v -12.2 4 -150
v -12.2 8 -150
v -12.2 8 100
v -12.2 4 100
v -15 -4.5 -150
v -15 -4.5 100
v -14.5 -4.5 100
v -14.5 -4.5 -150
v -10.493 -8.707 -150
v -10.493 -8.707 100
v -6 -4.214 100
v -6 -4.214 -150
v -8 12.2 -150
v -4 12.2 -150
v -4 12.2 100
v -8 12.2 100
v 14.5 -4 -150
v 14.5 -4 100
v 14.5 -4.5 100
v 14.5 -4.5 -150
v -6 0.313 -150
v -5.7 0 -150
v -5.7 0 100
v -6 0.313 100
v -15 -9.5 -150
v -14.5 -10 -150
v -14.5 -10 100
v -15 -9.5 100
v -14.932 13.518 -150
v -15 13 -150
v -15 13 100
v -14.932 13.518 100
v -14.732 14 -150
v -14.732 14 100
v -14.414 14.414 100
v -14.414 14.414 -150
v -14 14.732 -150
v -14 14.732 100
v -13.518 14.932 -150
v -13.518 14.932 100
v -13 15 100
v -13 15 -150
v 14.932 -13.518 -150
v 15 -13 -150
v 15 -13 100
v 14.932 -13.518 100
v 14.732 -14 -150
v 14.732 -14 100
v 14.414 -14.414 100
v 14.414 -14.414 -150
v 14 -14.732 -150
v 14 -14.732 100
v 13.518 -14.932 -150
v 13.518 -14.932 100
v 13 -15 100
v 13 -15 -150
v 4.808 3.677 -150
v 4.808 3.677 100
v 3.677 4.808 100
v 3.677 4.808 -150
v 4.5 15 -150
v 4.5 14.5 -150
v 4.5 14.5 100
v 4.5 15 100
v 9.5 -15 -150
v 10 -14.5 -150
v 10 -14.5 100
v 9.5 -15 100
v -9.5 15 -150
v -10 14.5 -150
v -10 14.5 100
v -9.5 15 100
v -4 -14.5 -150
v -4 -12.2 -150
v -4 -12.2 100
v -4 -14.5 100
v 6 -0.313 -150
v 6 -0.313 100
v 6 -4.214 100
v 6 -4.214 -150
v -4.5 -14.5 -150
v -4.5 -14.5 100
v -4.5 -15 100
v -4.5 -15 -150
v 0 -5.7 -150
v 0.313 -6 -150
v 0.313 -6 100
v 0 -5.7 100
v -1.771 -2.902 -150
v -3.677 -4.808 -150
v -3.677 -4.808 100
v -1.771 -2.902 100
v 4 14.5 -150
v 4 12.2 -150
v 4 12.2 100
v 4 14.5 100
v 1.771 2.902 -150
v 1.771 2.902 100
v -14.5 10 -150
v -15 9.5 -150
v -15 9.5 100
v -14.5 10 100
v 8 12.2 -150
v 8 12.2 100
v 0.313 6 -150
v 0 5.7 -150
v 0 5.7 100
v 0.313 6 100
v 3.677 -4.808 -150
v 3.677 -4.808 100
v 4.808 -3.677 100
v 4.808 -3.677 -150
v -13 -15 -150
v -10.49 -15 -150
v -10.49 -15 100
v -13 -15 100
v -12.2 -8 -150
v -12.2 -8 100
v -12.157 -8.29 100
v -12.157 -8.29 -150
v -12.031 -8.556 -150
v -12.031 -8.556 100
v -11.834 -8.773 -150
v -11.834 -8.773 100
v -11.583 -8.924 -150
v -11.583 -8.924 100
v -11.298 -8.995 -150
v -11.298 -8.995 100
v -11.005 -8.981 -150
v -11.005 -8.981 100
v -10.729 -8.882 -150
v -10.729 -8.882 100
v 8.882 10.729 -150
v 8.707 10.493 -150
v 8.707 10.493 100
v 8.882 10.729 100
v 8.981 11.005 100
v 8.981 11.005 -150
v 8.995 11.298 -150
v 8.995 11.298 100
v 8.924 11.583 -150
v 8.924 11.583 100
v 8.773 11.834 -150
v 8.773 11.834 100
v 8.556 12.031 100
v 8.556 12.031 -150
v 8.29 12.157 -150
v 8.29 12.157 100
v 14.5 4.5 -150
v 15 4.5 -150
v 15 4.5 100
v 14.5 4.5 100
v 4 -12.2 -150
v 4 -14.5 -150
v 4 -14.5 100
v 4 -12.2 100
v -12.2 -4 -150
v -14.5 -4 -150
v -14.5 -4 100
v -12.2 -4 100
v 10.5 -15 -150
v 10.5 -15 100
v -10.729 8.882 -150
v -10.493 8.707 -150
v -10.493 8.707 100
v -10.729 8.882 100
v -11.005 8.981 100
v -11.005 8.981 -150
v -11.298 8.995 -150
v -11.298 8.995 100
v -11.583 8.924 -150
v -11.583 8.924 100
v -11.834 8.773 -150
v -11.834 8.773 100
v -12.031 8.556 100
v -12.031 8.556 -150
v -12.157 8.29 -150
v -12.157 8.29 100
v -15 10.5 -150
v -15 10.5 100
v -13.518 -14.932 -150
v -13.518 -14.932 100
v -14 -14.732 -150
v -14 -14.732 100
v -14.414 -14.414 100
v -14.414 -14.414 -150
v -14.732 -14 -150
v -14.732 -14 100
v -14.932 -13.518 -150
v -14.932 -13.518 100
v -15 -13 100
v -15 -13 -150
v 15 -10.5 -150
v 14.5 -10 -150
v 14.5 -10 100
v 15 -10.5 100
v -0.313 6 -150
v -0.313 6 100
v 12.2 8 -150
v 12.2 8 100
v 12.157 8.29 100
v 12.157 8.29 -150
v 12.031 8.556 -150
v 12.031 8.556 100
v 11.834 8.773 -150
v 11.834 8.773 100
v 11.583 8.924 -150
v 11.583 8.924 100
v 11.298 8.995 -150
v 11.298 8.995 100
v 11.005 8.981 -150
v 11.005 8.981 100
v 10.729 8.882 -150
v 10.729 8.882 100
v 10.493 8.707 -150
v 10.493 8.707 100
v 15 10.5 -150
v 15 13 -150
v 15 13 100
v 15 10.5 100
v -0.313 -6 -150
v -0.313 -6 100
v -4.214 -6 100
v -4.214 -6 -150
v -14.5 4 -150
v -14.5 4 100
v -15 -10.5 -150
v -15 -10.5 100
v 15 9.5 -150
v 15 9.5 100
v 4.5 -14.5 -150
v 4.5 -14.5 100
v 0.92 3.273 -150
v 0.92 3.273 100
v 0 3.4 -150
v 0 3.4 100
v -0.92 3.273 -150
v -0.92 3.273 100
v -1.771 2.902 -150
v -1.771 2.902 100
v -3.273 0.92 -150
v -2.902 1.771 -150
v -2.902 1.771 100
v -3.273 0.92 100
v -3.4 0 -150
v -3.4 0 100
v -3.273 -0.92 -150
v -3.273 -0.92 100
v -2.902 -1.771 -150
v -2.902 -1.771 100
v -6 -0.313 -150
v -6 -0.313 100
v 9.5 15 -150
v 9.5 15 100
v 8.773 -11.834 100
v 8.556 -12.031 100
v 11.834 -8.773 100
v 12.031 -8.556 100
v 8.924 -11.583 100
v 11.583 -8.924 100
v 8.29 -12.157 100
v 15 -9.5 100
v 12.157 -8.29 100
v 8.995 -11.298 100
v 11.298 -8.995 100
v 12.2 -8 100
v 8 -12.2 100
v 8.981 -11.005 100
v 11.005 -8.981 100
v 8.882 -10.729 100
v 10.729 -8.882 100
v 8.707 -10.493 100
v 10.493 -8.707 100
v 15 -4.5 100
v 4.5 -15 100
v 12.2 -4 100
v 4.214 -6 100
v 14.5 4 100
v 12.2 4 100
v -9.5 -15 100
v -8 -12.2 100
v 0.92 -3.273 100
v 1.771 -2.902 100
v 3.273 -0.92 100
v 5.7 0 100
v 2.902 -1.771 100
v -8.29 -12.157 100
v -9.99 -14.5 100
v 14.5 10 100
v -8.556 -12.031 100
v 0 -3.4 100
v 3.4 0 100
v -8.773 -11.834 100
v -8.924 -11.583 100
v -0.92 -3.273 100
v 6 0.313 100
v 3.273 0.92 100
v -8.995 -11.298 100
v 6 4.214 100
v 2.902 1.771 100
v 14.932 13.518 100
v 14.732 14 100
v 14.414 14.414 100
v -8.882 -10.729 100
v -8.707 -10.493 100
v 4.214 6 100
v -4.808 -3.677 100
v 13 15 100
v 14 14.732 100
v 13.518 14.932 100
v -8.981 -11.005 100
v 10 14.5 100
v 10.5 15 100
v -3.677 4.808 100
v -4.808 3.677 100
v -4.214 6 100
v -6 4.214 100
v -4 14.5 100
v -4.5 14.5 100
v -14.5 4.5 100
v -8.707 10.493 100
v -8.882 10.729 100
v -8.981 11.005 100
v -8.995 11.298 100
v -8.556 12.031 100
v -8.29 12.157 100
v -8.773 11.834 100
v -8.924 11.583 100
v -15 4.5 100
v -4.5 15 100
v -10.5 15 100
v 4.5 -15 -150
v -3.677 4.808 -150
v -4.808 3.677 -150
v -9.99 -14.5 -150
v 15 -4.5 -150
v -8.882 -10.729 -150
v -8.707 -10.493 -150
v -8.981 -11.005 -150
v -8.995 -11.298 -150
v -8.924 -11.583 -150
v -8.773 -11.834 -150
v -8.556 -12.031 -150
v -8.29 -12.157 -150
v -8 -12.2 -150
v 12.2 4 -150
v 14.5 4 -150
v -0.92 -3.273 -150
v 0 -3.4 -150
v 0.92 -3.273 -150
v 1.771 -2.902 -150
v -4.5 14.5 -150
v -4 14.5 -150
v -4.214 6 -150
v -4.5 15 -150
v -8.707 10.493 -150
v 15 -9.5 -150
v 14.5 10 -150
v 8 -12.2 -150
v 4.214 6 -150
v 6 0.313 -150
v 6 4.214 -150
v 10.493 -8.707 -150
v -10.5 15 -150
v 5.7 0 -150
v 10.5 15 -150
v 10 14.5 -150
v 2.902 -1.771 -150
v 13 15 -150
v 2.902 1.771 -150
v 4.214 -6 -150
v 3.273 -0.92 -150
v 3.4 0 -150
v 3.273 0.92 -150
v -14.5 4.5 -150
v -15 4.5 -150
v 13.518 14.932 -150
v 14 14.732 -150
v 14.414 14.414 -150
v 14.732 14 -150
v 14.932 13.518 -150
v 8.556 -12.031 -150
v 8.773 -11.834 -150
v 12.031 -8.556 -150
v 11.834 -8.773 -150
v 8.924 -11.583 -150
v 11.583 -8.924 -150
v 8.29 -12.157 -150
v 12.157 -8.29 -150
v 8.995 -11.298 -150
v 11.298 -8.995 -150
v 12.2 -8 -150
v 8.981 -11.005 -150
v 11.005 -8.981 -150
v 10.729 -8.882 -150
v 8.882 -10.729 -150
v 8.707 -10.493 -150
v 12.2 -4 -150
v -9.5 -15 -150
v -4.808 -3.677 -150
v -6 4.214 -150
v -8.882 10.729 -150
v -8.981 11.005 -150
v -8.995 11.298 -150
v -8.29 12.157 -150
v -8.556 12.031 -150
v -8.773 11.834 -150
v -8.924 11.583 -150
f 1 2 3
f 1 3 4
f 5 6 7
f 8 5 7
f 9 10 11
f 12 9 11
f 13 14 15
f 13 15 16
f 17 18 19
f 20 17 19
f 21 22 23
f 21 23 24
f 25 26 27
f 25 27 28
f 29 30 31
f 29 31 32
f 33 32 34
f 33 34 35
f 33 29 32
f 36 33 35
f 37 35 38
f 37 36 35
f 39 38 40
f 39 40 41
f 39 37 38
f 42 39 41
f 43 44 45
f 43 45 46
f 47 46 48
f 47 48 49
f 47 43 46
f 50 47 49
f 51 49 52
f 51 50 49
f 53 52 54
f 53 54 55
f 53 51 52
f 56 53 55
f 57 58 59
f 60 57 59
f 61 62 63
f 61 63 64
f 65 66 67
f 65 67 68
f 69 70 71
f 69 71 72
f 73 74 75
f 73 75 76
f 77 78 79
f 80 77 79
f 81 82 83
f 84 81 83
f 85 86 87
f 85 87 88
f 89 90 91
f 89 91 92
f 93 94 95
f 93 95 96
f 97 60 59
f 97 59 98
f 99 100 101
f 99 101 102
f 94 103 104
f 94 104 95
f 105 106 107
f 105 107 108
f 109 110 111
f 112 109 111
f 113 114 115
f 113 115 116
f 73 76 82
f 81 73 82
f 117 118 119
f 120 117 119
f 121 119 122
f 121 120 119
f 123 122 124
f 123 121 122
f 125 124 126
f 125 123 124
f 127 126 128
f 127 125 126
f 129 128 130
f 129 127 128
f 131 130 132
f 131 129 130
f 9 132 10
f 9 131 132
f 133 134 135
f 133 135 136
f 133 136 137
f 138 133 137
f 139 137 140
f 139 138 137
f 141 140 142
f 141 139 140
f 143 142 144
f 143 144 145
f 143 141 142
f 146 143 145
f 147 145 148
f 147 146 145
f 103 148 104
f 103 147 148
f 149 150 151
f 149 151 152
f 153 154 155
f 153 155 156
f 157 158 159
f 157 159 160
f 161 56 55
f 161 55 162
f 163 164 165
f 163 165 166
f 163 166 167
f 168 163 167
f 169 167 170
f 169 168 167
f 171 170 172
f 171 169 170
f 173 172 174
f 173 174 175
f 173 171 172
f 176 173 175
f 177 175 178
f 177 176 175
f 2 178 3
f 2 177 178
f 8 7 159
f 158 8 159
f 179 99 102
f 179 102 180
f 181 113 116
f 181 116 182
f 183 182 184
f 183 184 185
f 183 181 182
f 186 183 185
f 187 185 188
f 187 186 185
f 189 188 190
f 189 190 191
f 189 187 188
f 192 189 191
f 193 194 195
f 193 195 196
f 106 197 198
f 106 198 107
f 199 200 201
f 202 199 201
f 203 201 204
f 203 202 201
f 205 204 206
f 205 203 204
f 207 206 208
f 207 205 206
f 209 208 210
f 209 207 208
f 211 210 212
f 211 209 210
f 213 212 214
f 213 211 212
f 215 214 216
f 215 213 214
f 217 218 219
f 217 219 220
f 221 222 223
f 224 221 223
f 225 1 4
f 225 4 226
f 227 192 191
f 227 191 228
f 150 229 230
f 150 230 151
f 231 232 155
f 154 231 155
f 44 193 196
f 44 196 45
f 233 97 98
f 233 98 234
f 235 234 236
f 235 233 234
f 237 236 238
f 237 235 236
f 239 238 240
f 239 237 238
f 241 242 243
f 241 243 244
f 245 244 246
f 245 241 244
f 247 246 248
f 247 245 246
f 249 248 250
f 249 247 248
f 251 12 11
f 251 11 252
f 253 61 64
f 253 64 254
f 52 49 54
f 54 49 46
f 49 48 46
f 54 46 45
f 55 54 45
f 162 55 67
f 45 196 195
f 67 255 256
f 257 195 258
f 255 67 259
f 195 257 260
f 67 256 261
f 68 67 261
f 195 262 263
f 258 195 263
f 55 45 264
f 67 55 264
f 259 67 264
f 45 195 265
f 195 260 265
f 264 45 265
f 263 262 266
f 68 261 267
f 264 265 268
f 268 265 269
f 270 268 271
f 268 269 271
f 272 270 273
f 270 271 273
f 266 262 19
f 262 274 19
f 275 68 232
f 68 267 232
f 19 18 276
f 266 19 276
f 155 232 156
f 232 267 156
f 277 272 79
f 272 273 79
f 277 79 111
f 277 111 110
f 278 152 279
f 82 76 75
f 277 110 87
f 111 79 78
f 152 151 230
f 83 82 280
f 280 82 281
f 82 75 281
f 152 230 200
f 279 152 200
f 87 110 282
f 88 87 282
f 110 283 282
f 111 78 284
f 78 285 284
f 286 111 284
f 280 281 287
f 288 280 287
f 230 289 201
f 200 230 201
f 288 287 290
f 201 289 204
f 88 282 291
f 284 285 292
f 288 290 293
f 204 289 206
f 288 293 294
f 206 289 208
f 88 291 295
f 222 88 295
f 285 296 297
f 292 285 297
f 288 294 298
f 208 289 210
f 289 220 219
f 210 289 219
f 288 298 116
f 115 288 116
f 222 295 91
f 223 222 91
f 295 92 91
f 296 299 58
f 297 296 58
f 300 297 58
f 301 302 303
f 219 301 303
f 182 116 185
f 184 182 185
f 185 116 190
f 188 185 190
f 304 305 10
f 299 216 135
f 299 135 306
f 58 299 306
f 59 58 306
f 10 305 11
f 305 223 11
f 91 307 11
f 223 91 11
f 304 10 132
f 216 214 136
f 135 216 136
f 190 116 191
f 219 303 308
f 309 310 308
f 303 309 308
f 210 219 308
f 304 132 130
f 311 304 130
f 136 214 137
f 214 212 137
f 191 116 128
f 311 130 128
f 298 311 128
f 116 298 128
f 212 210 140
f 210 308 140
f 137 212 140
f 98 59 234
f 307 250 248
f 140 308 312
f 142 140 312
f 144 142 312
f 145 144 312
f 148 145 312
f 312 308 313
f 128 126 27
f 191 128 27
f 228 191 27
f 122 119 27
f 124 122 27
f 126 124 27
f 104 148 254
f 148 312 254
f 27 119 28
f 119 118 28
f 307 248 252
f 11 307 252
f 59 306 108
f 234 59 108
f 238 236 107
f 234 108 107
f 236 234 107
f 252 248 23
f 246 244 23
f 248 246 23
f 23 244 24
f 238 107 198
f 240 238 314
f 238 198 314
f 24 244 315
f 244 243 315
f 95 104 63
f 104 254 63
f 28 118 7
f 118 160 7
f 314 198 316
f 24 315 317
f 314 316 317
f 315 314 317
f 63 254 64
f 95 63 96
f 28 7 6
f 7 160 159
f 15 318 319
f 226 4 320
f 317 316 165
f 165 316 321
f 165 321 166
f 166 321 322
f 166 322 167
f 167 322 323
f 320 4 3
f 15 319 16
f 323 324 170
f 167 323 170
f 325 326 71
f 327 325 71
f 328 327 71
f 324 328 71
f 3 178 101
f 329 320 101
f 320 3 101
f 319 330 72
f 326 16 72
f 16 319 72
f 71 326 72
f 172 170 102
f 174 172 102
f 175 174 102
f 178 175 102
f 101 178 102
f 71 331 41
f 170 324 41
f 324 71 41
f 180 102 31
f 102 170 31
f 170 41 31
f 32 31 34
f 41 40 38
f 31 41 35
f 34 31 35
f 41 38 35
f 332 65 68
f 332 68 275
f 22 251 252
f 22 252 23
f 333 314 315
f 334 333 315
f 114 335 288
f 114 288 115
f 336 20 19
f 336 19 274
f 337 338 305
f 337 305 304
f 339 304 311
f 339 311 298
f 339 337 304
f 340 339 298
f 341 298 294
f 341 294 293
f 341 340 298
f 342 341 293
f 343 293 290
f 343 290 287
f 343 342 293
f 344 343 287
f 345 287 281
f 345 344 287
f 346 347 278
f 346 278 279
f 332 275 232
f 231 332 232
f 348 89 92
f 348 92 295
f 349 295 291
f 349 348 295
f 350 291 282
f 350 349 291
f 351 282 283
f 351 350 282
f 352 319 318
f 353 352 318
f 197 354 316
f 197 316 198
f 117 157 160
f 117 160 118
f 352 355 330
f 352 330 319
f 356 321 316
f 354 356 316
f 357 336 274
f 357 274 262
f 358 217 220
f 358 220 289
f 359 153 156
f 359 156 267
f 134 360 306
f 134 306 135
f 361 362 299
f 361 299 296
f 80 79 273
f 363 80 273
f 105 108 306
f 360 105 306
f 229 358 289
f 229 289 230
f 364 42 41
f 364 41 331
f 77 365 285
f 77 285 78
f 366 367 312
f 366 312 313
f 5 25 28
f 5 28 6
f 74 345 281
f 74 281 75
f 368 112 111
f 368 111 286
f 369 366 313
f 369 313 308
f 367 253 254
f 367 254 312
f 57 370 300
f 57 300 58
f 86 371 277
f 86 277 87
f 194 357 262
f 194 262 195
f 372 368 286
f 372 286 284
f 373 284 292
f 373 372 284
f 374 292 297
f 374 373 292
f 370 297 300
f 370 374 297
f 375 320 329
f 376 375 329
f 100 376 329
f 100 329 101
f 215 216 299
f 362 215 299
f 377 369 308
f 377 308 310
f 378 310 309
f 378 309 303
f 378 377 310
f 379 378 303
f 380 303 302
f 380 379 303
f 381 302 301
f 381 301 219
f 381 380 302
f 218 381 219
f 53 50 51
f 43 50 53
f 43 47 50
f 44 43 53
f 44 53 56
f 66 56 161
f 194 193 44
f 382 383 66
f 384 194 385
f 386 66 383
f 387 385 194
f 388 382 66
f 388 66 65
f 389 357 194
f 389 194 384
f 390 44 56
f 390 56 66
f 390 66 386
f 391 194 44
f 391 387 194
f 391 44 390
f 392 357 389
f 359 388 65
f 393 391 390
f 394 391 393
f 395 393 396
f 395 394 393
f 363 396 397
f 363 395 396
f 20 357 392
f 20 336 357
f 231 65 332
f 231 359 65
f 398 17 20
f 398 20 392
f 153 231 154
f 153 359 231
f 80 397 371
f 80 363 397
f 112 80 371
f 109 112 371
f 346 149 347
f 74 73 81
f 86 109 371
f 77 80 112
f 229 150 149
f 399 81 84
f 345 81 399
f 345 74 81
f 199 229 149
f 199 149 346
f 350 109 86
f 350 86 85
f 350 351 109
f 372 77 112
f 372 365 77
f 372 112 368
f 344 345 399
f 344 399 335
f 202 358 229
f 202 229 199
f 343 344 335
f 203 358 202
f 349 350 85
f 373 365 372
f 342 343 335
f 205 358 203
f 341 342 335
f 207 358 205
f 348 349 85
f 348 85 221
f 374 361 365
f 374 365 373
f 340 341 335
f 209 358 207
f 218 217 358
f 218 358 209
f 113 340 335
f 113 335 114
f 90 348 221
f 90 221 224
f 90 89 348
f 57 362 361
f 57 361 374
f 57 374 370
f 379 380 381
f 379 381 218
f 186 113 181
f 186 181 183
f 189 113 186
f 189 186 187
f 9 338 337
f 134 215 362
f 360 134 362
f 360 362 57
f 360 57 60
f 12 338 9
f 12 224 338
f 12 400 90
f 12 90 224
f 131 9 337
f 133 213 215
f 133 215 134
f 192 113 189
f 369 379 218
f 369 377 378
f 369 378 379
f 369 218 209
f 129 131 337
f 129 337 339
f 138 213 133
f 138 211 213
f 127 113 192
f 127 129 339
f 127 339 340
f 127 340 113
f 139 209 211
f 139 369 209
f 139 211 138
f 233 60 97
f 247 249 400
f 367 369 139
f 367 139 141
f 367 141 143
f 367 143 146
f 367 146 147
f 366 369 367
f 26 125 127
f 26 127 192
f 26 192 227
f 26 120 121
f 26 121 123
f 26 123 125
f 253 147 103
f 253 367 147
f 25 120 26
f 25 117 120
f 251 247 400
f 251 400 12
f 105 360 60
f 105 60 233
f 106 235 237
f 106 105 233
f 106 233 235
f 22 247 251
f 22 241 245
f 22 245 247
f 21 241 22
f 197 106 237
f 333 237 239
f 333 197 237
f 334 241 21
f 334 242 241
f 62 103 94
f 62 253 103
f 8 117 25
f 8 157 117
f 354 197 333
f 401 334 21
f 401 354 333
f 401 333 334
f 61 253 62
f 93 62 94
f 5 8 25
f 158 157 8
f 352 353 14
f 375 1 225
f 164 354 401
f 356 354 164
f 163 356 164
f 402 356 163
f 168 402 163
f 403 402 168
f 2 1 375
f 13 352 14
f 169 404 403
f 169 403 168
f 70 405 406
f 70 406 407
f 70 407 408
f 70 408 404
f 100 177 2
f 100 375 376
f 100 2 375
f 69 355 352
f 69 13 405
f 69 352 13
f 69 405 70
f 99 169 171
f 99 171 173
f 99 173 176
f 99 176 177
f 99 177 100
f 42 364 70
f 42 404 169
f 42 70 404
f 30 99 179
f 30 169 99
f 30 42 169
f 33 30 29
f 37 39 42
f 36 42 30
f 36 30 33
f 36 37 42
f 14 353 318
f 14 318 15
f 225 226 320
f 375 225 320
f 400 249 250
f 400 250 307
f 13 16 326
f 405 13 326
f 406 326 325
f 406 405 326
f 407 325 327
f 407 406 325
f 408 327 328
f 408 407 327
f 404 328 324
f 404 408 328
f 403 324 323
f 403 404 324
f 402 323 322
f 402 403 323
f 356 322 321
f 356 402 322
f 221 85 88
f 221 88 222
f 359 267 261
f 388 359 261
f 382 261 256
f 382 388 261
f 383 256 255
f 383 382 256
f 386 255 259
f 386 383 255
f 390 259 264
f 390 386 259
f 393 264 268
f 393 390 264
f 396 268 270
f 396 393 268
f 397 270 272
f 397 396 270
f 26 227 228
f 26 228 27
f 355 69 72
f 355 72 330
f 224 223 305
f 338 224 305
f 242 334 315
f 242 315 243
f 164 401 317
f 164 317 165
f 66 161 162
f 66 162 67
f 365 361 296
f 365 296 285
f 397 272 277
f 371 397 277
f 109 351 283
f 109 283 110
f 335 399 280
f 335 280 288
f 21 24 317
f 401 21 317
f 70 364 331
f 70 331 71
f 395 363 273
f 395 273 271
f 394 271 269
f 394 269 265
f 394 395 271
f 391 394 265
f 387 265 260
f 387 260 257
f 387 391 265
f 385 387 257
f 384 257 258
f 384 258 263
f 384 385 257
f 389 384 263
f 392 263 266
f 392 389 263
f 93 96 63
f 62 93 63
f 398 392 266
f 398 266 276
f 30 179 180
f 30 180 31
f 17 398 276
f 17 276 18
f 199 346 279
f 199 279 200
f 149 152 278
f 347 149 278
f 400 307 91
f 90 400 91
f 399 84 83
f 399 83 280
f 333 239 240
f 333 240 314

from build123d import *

# Parameters (mm, degrees)
BOSS_EXTRUDE1_DEPTH = 250


with BuildPart() as part:
    # Sketch1 → Boss-Extrude1 (new body)
    with BuildSketch(Plane(origin=(0, 0, -150), x_dir=(-1, 0, 0), z_dir=(0, 0, -1))):
        with BuildLine():
            Line((-14.999999999, 12.999999999), (-14.999999999, 10.499999999))
            Line((-14.999999999, 10.499999999), (-14.499999999, 9.999999999))
            Line((-14.499999999, 9.999999999), (-14.999999999, 9.5))
            Line((-14.999999999, 9.5), (-14.999999999, 4.5))
            Line((-14.999999999, 4.5), (-14.5, 4.5))
            Line((-14.5, 4.5), (-14.5, 4))
            Line((-14.5, 4), (-12.200000005, 4))
            Line((-12.200000005, 4), (-12.200000005, 7.999999995))
            ThreePointArc((-12.200000005, 7.999999995), (-11.582683434, 8.923879532), (-10.492893215, 8.70710678))
            Line((-10.492893215, 8.70710678), (-6, 4.214213564))
            Line((-6, 4.214213564), (-6, 0.312520903))
            Line((-6, 0.312520903), (-5.7, 0))
            Line((-5.7, 0), (-6, -0.312520901))
            Line((-6, -0.312520901), (-6, -4.214213564))
            Line((-6, -4.214213564), (-10.492893215, -8.70710678))
            ThreePointArc((-10.492893215, -8.70710678), (-11.582683434, -8.923879532), (-12.200000005, -7.999999995))
            Line((-12.200000005, -7.999999995), (-12.200000005, -4))
            Line((-12.200000005, -4), (-14.5, -4))
            Line((-14.5, -4), (-14.5, -4.5))
            Line((-14.5, -4.5), (-14.999999999, -4.5))
            Line((-14.999999999, -4.5), (-14.999999999, -9.500000003))
            Line((-14.999999999, -9.500000003), (-14.499999999, -10.000000002))
            Line((-14.499999999, -10.000000002), (-14.999999999, -10.500000001))
            Line((-14.999999999, -10.500000001), (-14.999999999, -13))
            ThreePointArc((-14.999999999, -13), (-14.414213561, -14.414213562), (-12.999999999, -15))
            Line((-12.999999999, -15), (-10.5, -15))
            Line((-10.5, -15), (-10.000000001, -14.500000001))
            Line((-10.000000001, -14.500000001), (-9.500000001, -15))
            Line((-9.500000001, -15), (-4.5, -15))
            Line((-4.5, -15), (-4.5, -14.5))
            Line((-4.5, -14.5), (-4, -14.5))
            Line((-4, -14.5), (-4, -12.200000005))
            Line((-4, -12.200000005), (-7.999999995, -12.200000005))
            ThreePointArc((-7.999999995, -12.200000005), (-8.923879532, -11.582683434), (-8.70710678, -10.492893215))
            Line((-8.70710678, -10.492893215), (-4.214213564, -6))
            Line((-4.214213564, -6), (-0.312520903, -6))
            Line((-0.312520903, -6), (0, -5.7))
            Line((0, -5.7), (0.312520901, -6))
            Line((0.312520901, -6), (4.214213564, -6))
            Line((4.214213564, -6), (8.70710678, -10.492893215))
            ThreePointArc((8.70710678, -10.492893215), (8.923879532, -11.582683434), (7.999999995, -12.200000005))
            Line((7.999999995, -12.200000005), (4, -12.200000005))
            Line((4, -12.200000005), (4, -14.5))
            Line((4, -14.5), (4.5, -14.5))
            Line((4.5, -14.5), (4.5, -15))
            Line((4.5, -15), (9.500000001, -15))
            Line((9.500000001, -15), (9.989897949, -14.5))
            Line((9.989897949, -14.5), (10.489897949, -15))
            Line((10.489897949, -15), (13, -15))
            ThreePointArc((13, -15), (14.414213562, -14.414213562), (15, -13))
            Line((15, -13), (15, -10.5))
            Line((15, -10.5), (14.500000001, -10.000000001))
            Line((14.500000001, -10.000000001), (15, -9.500000001))
            Line((15, -9.500000001), (15, -4.5))
            Line((15, -4.5), (14.5, -4.5))
            Line((14.5, -4.5), (14.5, -4))
            Line((14.5, -4), (12.200000005, -4))
            Line((12.200000005, -4), (12.200000005, -7.999999995))
            ThreePointArc((12.200000005, -7.999999995), (11.582683434, -8.923879532), (10.492893215, -8.70710678))
            Line((10.492893215, -8.70710678), (6, -4.214213564))
            Line((6, -4.214213564), (6, -0.312520903))
            Line((6, -0.312520903), (5.7, 0))
            Line((5.7, 0), (6, 0.312520901))
            Line((6, 0.312520901), (6, 4.214213564))
            Line((6, 4.214213564), (10.492893215, 8.707106779))
            ThreePointArc((10.492893215, 8.707106779), (11.582683434, 8.923879532), (12.200000005, 7.999999994))
            Line((12.200000005, 7.999999994), (12.200000005, 4))
            Line((12.200000005, 4), (14.5, 4))
            Line((14.5, 4), (14.5, 4.5))
            Line((14.5, 4.5), (15, 4.5))
            Line((15, 4.5), (15, 9.500000001))
            Line((15, 9.500000001), (14.500000001, 10.000000001))
            Line((14.500000001, 10.000000001), (15, 10.5))
            Line((15, 10.5), (15, 12.999999999))
            ThreePointArc((15, 12.999999999), (14.414213562, 14.414213561), (13, 14.999999999))
            Line((13, 14.999999999), (10.500000001, 14.999999999))
            Line((10.500000001, 14.999999999), (10.000000002, 14.499999999))
            Line((10.000000002, 14.499999999), (9.500000003, 14.999999999))
            Line((9.500000003, 14.999999999), (4.5, 14.999999999))
            Line((4.5, 14.999999999), (4.5, 14.5))
            Line((4.5, 14.5), (4, 14.5))
            Line((4, 14.5), (4, 12.200000005))
            Line((4, 12.200000005), (7.999999995, 12.200000005))
            ThreePointArc((7.999999995, 12.200000005), (8.923879532, 11.582683434), (8.70710678, 10.492893215))
            Line((8.70710678, 10.492893215), (4.214213564, 6))
            Line((4.214213564, 6), (0.312520903, 6))
            Line((0.312520903, 6), (0, 5.7))
            Line((0, 5.7), (-0.312520901, 6))
            Line((-0.312520901, 6), (-4.214213564, 6))
            Line((-4.214213564, 6), (-8.707106779, 10.492893215))
            ThreePointArc((-8.707106779, 10.492893215), (-8.923879532, 11.582683434), (-7.999999994, 12.200000005))
            Line((-7.999999994, 12.200000005), (-4, 12.200000005))
            Line((-4, 12.200000005), (-4, 14.5))
            Line((-4, 14.5), (-4.5, 14.5))
            Line((-4.5, 14.5), (-4.5, 14.999999999))
            Line((-4.5, 14.999999999), (-9.5, 14.999999999))
            Line((-9.5, 14.999999999), (-9.999999999, 14.499999999))
            Line((-9.999999999, 14.499999999), (-10.499999999, 14.999999999))
            Line((-10.499999999, 14.999999999), (-12.999999999, 14.999999999))
            ThreePointArc((-12.999999999, 14.999999999), (-14.414213561, 14.414213561), (-14.999999999, 12.999999999))
        make_face()
        with BuildLine():
            Line((4.808326112, 3.676955262), (2.902349714, 1.770978864))
            ThreePointArc((2.902349714, 1.770978864), (3.4, 0), (2.902349714, -1.770978864))
            Line((2.902349714, -1.770978864), (4.808326112, -3.676955262))
            Line((4.808326112, -3.676955262), (3.676955262, -4.808326112))
            Line((3.676955262, -4.808326112), (1.770978864, -2.902349714))
            ThreePointArc((1.770978864, -2.902349714), (0, -3.4), (-1.770978864, -2.902349714))
            Line((-1.770978864, -2.902349714), (-3.676955262, -4.808326112))
            Line((-3.676955262, -4.808326112), (-4.808326112, -3.676955262))
            Line((-4.808326112, -3.676955262), (-2.902349714, -1.770978864))
            ThreePointArc((-2.902349714, -1.770978864), (-3.4, 0), (-2.902349714, 1.770978864))
            Line((-2.902349714, 1.770978864), (-4.808326112, 3.676955262))
            Line((-4.808326112, 3.676955262), (-3.676955262, 4.808326112))
            Line((-3.676955262, 4.808326112), (-1.770978864, 2.902349714))
            ThreePointArc((-1.770978864, 2.902349714), (0, 3.4), (1.770978864, 2.902349714))
            Line((1.770978864, 2.902349714), (3.676955262, 4.808326112))
            Line((3.676955262, 4.808326112), (4.808326112, 3.676955262))
        make_face(mode=Mode.SUBTRACT)
    extrude(amount=-BOSS_EXTRUDE1_DEPTH)


solid = part.part
